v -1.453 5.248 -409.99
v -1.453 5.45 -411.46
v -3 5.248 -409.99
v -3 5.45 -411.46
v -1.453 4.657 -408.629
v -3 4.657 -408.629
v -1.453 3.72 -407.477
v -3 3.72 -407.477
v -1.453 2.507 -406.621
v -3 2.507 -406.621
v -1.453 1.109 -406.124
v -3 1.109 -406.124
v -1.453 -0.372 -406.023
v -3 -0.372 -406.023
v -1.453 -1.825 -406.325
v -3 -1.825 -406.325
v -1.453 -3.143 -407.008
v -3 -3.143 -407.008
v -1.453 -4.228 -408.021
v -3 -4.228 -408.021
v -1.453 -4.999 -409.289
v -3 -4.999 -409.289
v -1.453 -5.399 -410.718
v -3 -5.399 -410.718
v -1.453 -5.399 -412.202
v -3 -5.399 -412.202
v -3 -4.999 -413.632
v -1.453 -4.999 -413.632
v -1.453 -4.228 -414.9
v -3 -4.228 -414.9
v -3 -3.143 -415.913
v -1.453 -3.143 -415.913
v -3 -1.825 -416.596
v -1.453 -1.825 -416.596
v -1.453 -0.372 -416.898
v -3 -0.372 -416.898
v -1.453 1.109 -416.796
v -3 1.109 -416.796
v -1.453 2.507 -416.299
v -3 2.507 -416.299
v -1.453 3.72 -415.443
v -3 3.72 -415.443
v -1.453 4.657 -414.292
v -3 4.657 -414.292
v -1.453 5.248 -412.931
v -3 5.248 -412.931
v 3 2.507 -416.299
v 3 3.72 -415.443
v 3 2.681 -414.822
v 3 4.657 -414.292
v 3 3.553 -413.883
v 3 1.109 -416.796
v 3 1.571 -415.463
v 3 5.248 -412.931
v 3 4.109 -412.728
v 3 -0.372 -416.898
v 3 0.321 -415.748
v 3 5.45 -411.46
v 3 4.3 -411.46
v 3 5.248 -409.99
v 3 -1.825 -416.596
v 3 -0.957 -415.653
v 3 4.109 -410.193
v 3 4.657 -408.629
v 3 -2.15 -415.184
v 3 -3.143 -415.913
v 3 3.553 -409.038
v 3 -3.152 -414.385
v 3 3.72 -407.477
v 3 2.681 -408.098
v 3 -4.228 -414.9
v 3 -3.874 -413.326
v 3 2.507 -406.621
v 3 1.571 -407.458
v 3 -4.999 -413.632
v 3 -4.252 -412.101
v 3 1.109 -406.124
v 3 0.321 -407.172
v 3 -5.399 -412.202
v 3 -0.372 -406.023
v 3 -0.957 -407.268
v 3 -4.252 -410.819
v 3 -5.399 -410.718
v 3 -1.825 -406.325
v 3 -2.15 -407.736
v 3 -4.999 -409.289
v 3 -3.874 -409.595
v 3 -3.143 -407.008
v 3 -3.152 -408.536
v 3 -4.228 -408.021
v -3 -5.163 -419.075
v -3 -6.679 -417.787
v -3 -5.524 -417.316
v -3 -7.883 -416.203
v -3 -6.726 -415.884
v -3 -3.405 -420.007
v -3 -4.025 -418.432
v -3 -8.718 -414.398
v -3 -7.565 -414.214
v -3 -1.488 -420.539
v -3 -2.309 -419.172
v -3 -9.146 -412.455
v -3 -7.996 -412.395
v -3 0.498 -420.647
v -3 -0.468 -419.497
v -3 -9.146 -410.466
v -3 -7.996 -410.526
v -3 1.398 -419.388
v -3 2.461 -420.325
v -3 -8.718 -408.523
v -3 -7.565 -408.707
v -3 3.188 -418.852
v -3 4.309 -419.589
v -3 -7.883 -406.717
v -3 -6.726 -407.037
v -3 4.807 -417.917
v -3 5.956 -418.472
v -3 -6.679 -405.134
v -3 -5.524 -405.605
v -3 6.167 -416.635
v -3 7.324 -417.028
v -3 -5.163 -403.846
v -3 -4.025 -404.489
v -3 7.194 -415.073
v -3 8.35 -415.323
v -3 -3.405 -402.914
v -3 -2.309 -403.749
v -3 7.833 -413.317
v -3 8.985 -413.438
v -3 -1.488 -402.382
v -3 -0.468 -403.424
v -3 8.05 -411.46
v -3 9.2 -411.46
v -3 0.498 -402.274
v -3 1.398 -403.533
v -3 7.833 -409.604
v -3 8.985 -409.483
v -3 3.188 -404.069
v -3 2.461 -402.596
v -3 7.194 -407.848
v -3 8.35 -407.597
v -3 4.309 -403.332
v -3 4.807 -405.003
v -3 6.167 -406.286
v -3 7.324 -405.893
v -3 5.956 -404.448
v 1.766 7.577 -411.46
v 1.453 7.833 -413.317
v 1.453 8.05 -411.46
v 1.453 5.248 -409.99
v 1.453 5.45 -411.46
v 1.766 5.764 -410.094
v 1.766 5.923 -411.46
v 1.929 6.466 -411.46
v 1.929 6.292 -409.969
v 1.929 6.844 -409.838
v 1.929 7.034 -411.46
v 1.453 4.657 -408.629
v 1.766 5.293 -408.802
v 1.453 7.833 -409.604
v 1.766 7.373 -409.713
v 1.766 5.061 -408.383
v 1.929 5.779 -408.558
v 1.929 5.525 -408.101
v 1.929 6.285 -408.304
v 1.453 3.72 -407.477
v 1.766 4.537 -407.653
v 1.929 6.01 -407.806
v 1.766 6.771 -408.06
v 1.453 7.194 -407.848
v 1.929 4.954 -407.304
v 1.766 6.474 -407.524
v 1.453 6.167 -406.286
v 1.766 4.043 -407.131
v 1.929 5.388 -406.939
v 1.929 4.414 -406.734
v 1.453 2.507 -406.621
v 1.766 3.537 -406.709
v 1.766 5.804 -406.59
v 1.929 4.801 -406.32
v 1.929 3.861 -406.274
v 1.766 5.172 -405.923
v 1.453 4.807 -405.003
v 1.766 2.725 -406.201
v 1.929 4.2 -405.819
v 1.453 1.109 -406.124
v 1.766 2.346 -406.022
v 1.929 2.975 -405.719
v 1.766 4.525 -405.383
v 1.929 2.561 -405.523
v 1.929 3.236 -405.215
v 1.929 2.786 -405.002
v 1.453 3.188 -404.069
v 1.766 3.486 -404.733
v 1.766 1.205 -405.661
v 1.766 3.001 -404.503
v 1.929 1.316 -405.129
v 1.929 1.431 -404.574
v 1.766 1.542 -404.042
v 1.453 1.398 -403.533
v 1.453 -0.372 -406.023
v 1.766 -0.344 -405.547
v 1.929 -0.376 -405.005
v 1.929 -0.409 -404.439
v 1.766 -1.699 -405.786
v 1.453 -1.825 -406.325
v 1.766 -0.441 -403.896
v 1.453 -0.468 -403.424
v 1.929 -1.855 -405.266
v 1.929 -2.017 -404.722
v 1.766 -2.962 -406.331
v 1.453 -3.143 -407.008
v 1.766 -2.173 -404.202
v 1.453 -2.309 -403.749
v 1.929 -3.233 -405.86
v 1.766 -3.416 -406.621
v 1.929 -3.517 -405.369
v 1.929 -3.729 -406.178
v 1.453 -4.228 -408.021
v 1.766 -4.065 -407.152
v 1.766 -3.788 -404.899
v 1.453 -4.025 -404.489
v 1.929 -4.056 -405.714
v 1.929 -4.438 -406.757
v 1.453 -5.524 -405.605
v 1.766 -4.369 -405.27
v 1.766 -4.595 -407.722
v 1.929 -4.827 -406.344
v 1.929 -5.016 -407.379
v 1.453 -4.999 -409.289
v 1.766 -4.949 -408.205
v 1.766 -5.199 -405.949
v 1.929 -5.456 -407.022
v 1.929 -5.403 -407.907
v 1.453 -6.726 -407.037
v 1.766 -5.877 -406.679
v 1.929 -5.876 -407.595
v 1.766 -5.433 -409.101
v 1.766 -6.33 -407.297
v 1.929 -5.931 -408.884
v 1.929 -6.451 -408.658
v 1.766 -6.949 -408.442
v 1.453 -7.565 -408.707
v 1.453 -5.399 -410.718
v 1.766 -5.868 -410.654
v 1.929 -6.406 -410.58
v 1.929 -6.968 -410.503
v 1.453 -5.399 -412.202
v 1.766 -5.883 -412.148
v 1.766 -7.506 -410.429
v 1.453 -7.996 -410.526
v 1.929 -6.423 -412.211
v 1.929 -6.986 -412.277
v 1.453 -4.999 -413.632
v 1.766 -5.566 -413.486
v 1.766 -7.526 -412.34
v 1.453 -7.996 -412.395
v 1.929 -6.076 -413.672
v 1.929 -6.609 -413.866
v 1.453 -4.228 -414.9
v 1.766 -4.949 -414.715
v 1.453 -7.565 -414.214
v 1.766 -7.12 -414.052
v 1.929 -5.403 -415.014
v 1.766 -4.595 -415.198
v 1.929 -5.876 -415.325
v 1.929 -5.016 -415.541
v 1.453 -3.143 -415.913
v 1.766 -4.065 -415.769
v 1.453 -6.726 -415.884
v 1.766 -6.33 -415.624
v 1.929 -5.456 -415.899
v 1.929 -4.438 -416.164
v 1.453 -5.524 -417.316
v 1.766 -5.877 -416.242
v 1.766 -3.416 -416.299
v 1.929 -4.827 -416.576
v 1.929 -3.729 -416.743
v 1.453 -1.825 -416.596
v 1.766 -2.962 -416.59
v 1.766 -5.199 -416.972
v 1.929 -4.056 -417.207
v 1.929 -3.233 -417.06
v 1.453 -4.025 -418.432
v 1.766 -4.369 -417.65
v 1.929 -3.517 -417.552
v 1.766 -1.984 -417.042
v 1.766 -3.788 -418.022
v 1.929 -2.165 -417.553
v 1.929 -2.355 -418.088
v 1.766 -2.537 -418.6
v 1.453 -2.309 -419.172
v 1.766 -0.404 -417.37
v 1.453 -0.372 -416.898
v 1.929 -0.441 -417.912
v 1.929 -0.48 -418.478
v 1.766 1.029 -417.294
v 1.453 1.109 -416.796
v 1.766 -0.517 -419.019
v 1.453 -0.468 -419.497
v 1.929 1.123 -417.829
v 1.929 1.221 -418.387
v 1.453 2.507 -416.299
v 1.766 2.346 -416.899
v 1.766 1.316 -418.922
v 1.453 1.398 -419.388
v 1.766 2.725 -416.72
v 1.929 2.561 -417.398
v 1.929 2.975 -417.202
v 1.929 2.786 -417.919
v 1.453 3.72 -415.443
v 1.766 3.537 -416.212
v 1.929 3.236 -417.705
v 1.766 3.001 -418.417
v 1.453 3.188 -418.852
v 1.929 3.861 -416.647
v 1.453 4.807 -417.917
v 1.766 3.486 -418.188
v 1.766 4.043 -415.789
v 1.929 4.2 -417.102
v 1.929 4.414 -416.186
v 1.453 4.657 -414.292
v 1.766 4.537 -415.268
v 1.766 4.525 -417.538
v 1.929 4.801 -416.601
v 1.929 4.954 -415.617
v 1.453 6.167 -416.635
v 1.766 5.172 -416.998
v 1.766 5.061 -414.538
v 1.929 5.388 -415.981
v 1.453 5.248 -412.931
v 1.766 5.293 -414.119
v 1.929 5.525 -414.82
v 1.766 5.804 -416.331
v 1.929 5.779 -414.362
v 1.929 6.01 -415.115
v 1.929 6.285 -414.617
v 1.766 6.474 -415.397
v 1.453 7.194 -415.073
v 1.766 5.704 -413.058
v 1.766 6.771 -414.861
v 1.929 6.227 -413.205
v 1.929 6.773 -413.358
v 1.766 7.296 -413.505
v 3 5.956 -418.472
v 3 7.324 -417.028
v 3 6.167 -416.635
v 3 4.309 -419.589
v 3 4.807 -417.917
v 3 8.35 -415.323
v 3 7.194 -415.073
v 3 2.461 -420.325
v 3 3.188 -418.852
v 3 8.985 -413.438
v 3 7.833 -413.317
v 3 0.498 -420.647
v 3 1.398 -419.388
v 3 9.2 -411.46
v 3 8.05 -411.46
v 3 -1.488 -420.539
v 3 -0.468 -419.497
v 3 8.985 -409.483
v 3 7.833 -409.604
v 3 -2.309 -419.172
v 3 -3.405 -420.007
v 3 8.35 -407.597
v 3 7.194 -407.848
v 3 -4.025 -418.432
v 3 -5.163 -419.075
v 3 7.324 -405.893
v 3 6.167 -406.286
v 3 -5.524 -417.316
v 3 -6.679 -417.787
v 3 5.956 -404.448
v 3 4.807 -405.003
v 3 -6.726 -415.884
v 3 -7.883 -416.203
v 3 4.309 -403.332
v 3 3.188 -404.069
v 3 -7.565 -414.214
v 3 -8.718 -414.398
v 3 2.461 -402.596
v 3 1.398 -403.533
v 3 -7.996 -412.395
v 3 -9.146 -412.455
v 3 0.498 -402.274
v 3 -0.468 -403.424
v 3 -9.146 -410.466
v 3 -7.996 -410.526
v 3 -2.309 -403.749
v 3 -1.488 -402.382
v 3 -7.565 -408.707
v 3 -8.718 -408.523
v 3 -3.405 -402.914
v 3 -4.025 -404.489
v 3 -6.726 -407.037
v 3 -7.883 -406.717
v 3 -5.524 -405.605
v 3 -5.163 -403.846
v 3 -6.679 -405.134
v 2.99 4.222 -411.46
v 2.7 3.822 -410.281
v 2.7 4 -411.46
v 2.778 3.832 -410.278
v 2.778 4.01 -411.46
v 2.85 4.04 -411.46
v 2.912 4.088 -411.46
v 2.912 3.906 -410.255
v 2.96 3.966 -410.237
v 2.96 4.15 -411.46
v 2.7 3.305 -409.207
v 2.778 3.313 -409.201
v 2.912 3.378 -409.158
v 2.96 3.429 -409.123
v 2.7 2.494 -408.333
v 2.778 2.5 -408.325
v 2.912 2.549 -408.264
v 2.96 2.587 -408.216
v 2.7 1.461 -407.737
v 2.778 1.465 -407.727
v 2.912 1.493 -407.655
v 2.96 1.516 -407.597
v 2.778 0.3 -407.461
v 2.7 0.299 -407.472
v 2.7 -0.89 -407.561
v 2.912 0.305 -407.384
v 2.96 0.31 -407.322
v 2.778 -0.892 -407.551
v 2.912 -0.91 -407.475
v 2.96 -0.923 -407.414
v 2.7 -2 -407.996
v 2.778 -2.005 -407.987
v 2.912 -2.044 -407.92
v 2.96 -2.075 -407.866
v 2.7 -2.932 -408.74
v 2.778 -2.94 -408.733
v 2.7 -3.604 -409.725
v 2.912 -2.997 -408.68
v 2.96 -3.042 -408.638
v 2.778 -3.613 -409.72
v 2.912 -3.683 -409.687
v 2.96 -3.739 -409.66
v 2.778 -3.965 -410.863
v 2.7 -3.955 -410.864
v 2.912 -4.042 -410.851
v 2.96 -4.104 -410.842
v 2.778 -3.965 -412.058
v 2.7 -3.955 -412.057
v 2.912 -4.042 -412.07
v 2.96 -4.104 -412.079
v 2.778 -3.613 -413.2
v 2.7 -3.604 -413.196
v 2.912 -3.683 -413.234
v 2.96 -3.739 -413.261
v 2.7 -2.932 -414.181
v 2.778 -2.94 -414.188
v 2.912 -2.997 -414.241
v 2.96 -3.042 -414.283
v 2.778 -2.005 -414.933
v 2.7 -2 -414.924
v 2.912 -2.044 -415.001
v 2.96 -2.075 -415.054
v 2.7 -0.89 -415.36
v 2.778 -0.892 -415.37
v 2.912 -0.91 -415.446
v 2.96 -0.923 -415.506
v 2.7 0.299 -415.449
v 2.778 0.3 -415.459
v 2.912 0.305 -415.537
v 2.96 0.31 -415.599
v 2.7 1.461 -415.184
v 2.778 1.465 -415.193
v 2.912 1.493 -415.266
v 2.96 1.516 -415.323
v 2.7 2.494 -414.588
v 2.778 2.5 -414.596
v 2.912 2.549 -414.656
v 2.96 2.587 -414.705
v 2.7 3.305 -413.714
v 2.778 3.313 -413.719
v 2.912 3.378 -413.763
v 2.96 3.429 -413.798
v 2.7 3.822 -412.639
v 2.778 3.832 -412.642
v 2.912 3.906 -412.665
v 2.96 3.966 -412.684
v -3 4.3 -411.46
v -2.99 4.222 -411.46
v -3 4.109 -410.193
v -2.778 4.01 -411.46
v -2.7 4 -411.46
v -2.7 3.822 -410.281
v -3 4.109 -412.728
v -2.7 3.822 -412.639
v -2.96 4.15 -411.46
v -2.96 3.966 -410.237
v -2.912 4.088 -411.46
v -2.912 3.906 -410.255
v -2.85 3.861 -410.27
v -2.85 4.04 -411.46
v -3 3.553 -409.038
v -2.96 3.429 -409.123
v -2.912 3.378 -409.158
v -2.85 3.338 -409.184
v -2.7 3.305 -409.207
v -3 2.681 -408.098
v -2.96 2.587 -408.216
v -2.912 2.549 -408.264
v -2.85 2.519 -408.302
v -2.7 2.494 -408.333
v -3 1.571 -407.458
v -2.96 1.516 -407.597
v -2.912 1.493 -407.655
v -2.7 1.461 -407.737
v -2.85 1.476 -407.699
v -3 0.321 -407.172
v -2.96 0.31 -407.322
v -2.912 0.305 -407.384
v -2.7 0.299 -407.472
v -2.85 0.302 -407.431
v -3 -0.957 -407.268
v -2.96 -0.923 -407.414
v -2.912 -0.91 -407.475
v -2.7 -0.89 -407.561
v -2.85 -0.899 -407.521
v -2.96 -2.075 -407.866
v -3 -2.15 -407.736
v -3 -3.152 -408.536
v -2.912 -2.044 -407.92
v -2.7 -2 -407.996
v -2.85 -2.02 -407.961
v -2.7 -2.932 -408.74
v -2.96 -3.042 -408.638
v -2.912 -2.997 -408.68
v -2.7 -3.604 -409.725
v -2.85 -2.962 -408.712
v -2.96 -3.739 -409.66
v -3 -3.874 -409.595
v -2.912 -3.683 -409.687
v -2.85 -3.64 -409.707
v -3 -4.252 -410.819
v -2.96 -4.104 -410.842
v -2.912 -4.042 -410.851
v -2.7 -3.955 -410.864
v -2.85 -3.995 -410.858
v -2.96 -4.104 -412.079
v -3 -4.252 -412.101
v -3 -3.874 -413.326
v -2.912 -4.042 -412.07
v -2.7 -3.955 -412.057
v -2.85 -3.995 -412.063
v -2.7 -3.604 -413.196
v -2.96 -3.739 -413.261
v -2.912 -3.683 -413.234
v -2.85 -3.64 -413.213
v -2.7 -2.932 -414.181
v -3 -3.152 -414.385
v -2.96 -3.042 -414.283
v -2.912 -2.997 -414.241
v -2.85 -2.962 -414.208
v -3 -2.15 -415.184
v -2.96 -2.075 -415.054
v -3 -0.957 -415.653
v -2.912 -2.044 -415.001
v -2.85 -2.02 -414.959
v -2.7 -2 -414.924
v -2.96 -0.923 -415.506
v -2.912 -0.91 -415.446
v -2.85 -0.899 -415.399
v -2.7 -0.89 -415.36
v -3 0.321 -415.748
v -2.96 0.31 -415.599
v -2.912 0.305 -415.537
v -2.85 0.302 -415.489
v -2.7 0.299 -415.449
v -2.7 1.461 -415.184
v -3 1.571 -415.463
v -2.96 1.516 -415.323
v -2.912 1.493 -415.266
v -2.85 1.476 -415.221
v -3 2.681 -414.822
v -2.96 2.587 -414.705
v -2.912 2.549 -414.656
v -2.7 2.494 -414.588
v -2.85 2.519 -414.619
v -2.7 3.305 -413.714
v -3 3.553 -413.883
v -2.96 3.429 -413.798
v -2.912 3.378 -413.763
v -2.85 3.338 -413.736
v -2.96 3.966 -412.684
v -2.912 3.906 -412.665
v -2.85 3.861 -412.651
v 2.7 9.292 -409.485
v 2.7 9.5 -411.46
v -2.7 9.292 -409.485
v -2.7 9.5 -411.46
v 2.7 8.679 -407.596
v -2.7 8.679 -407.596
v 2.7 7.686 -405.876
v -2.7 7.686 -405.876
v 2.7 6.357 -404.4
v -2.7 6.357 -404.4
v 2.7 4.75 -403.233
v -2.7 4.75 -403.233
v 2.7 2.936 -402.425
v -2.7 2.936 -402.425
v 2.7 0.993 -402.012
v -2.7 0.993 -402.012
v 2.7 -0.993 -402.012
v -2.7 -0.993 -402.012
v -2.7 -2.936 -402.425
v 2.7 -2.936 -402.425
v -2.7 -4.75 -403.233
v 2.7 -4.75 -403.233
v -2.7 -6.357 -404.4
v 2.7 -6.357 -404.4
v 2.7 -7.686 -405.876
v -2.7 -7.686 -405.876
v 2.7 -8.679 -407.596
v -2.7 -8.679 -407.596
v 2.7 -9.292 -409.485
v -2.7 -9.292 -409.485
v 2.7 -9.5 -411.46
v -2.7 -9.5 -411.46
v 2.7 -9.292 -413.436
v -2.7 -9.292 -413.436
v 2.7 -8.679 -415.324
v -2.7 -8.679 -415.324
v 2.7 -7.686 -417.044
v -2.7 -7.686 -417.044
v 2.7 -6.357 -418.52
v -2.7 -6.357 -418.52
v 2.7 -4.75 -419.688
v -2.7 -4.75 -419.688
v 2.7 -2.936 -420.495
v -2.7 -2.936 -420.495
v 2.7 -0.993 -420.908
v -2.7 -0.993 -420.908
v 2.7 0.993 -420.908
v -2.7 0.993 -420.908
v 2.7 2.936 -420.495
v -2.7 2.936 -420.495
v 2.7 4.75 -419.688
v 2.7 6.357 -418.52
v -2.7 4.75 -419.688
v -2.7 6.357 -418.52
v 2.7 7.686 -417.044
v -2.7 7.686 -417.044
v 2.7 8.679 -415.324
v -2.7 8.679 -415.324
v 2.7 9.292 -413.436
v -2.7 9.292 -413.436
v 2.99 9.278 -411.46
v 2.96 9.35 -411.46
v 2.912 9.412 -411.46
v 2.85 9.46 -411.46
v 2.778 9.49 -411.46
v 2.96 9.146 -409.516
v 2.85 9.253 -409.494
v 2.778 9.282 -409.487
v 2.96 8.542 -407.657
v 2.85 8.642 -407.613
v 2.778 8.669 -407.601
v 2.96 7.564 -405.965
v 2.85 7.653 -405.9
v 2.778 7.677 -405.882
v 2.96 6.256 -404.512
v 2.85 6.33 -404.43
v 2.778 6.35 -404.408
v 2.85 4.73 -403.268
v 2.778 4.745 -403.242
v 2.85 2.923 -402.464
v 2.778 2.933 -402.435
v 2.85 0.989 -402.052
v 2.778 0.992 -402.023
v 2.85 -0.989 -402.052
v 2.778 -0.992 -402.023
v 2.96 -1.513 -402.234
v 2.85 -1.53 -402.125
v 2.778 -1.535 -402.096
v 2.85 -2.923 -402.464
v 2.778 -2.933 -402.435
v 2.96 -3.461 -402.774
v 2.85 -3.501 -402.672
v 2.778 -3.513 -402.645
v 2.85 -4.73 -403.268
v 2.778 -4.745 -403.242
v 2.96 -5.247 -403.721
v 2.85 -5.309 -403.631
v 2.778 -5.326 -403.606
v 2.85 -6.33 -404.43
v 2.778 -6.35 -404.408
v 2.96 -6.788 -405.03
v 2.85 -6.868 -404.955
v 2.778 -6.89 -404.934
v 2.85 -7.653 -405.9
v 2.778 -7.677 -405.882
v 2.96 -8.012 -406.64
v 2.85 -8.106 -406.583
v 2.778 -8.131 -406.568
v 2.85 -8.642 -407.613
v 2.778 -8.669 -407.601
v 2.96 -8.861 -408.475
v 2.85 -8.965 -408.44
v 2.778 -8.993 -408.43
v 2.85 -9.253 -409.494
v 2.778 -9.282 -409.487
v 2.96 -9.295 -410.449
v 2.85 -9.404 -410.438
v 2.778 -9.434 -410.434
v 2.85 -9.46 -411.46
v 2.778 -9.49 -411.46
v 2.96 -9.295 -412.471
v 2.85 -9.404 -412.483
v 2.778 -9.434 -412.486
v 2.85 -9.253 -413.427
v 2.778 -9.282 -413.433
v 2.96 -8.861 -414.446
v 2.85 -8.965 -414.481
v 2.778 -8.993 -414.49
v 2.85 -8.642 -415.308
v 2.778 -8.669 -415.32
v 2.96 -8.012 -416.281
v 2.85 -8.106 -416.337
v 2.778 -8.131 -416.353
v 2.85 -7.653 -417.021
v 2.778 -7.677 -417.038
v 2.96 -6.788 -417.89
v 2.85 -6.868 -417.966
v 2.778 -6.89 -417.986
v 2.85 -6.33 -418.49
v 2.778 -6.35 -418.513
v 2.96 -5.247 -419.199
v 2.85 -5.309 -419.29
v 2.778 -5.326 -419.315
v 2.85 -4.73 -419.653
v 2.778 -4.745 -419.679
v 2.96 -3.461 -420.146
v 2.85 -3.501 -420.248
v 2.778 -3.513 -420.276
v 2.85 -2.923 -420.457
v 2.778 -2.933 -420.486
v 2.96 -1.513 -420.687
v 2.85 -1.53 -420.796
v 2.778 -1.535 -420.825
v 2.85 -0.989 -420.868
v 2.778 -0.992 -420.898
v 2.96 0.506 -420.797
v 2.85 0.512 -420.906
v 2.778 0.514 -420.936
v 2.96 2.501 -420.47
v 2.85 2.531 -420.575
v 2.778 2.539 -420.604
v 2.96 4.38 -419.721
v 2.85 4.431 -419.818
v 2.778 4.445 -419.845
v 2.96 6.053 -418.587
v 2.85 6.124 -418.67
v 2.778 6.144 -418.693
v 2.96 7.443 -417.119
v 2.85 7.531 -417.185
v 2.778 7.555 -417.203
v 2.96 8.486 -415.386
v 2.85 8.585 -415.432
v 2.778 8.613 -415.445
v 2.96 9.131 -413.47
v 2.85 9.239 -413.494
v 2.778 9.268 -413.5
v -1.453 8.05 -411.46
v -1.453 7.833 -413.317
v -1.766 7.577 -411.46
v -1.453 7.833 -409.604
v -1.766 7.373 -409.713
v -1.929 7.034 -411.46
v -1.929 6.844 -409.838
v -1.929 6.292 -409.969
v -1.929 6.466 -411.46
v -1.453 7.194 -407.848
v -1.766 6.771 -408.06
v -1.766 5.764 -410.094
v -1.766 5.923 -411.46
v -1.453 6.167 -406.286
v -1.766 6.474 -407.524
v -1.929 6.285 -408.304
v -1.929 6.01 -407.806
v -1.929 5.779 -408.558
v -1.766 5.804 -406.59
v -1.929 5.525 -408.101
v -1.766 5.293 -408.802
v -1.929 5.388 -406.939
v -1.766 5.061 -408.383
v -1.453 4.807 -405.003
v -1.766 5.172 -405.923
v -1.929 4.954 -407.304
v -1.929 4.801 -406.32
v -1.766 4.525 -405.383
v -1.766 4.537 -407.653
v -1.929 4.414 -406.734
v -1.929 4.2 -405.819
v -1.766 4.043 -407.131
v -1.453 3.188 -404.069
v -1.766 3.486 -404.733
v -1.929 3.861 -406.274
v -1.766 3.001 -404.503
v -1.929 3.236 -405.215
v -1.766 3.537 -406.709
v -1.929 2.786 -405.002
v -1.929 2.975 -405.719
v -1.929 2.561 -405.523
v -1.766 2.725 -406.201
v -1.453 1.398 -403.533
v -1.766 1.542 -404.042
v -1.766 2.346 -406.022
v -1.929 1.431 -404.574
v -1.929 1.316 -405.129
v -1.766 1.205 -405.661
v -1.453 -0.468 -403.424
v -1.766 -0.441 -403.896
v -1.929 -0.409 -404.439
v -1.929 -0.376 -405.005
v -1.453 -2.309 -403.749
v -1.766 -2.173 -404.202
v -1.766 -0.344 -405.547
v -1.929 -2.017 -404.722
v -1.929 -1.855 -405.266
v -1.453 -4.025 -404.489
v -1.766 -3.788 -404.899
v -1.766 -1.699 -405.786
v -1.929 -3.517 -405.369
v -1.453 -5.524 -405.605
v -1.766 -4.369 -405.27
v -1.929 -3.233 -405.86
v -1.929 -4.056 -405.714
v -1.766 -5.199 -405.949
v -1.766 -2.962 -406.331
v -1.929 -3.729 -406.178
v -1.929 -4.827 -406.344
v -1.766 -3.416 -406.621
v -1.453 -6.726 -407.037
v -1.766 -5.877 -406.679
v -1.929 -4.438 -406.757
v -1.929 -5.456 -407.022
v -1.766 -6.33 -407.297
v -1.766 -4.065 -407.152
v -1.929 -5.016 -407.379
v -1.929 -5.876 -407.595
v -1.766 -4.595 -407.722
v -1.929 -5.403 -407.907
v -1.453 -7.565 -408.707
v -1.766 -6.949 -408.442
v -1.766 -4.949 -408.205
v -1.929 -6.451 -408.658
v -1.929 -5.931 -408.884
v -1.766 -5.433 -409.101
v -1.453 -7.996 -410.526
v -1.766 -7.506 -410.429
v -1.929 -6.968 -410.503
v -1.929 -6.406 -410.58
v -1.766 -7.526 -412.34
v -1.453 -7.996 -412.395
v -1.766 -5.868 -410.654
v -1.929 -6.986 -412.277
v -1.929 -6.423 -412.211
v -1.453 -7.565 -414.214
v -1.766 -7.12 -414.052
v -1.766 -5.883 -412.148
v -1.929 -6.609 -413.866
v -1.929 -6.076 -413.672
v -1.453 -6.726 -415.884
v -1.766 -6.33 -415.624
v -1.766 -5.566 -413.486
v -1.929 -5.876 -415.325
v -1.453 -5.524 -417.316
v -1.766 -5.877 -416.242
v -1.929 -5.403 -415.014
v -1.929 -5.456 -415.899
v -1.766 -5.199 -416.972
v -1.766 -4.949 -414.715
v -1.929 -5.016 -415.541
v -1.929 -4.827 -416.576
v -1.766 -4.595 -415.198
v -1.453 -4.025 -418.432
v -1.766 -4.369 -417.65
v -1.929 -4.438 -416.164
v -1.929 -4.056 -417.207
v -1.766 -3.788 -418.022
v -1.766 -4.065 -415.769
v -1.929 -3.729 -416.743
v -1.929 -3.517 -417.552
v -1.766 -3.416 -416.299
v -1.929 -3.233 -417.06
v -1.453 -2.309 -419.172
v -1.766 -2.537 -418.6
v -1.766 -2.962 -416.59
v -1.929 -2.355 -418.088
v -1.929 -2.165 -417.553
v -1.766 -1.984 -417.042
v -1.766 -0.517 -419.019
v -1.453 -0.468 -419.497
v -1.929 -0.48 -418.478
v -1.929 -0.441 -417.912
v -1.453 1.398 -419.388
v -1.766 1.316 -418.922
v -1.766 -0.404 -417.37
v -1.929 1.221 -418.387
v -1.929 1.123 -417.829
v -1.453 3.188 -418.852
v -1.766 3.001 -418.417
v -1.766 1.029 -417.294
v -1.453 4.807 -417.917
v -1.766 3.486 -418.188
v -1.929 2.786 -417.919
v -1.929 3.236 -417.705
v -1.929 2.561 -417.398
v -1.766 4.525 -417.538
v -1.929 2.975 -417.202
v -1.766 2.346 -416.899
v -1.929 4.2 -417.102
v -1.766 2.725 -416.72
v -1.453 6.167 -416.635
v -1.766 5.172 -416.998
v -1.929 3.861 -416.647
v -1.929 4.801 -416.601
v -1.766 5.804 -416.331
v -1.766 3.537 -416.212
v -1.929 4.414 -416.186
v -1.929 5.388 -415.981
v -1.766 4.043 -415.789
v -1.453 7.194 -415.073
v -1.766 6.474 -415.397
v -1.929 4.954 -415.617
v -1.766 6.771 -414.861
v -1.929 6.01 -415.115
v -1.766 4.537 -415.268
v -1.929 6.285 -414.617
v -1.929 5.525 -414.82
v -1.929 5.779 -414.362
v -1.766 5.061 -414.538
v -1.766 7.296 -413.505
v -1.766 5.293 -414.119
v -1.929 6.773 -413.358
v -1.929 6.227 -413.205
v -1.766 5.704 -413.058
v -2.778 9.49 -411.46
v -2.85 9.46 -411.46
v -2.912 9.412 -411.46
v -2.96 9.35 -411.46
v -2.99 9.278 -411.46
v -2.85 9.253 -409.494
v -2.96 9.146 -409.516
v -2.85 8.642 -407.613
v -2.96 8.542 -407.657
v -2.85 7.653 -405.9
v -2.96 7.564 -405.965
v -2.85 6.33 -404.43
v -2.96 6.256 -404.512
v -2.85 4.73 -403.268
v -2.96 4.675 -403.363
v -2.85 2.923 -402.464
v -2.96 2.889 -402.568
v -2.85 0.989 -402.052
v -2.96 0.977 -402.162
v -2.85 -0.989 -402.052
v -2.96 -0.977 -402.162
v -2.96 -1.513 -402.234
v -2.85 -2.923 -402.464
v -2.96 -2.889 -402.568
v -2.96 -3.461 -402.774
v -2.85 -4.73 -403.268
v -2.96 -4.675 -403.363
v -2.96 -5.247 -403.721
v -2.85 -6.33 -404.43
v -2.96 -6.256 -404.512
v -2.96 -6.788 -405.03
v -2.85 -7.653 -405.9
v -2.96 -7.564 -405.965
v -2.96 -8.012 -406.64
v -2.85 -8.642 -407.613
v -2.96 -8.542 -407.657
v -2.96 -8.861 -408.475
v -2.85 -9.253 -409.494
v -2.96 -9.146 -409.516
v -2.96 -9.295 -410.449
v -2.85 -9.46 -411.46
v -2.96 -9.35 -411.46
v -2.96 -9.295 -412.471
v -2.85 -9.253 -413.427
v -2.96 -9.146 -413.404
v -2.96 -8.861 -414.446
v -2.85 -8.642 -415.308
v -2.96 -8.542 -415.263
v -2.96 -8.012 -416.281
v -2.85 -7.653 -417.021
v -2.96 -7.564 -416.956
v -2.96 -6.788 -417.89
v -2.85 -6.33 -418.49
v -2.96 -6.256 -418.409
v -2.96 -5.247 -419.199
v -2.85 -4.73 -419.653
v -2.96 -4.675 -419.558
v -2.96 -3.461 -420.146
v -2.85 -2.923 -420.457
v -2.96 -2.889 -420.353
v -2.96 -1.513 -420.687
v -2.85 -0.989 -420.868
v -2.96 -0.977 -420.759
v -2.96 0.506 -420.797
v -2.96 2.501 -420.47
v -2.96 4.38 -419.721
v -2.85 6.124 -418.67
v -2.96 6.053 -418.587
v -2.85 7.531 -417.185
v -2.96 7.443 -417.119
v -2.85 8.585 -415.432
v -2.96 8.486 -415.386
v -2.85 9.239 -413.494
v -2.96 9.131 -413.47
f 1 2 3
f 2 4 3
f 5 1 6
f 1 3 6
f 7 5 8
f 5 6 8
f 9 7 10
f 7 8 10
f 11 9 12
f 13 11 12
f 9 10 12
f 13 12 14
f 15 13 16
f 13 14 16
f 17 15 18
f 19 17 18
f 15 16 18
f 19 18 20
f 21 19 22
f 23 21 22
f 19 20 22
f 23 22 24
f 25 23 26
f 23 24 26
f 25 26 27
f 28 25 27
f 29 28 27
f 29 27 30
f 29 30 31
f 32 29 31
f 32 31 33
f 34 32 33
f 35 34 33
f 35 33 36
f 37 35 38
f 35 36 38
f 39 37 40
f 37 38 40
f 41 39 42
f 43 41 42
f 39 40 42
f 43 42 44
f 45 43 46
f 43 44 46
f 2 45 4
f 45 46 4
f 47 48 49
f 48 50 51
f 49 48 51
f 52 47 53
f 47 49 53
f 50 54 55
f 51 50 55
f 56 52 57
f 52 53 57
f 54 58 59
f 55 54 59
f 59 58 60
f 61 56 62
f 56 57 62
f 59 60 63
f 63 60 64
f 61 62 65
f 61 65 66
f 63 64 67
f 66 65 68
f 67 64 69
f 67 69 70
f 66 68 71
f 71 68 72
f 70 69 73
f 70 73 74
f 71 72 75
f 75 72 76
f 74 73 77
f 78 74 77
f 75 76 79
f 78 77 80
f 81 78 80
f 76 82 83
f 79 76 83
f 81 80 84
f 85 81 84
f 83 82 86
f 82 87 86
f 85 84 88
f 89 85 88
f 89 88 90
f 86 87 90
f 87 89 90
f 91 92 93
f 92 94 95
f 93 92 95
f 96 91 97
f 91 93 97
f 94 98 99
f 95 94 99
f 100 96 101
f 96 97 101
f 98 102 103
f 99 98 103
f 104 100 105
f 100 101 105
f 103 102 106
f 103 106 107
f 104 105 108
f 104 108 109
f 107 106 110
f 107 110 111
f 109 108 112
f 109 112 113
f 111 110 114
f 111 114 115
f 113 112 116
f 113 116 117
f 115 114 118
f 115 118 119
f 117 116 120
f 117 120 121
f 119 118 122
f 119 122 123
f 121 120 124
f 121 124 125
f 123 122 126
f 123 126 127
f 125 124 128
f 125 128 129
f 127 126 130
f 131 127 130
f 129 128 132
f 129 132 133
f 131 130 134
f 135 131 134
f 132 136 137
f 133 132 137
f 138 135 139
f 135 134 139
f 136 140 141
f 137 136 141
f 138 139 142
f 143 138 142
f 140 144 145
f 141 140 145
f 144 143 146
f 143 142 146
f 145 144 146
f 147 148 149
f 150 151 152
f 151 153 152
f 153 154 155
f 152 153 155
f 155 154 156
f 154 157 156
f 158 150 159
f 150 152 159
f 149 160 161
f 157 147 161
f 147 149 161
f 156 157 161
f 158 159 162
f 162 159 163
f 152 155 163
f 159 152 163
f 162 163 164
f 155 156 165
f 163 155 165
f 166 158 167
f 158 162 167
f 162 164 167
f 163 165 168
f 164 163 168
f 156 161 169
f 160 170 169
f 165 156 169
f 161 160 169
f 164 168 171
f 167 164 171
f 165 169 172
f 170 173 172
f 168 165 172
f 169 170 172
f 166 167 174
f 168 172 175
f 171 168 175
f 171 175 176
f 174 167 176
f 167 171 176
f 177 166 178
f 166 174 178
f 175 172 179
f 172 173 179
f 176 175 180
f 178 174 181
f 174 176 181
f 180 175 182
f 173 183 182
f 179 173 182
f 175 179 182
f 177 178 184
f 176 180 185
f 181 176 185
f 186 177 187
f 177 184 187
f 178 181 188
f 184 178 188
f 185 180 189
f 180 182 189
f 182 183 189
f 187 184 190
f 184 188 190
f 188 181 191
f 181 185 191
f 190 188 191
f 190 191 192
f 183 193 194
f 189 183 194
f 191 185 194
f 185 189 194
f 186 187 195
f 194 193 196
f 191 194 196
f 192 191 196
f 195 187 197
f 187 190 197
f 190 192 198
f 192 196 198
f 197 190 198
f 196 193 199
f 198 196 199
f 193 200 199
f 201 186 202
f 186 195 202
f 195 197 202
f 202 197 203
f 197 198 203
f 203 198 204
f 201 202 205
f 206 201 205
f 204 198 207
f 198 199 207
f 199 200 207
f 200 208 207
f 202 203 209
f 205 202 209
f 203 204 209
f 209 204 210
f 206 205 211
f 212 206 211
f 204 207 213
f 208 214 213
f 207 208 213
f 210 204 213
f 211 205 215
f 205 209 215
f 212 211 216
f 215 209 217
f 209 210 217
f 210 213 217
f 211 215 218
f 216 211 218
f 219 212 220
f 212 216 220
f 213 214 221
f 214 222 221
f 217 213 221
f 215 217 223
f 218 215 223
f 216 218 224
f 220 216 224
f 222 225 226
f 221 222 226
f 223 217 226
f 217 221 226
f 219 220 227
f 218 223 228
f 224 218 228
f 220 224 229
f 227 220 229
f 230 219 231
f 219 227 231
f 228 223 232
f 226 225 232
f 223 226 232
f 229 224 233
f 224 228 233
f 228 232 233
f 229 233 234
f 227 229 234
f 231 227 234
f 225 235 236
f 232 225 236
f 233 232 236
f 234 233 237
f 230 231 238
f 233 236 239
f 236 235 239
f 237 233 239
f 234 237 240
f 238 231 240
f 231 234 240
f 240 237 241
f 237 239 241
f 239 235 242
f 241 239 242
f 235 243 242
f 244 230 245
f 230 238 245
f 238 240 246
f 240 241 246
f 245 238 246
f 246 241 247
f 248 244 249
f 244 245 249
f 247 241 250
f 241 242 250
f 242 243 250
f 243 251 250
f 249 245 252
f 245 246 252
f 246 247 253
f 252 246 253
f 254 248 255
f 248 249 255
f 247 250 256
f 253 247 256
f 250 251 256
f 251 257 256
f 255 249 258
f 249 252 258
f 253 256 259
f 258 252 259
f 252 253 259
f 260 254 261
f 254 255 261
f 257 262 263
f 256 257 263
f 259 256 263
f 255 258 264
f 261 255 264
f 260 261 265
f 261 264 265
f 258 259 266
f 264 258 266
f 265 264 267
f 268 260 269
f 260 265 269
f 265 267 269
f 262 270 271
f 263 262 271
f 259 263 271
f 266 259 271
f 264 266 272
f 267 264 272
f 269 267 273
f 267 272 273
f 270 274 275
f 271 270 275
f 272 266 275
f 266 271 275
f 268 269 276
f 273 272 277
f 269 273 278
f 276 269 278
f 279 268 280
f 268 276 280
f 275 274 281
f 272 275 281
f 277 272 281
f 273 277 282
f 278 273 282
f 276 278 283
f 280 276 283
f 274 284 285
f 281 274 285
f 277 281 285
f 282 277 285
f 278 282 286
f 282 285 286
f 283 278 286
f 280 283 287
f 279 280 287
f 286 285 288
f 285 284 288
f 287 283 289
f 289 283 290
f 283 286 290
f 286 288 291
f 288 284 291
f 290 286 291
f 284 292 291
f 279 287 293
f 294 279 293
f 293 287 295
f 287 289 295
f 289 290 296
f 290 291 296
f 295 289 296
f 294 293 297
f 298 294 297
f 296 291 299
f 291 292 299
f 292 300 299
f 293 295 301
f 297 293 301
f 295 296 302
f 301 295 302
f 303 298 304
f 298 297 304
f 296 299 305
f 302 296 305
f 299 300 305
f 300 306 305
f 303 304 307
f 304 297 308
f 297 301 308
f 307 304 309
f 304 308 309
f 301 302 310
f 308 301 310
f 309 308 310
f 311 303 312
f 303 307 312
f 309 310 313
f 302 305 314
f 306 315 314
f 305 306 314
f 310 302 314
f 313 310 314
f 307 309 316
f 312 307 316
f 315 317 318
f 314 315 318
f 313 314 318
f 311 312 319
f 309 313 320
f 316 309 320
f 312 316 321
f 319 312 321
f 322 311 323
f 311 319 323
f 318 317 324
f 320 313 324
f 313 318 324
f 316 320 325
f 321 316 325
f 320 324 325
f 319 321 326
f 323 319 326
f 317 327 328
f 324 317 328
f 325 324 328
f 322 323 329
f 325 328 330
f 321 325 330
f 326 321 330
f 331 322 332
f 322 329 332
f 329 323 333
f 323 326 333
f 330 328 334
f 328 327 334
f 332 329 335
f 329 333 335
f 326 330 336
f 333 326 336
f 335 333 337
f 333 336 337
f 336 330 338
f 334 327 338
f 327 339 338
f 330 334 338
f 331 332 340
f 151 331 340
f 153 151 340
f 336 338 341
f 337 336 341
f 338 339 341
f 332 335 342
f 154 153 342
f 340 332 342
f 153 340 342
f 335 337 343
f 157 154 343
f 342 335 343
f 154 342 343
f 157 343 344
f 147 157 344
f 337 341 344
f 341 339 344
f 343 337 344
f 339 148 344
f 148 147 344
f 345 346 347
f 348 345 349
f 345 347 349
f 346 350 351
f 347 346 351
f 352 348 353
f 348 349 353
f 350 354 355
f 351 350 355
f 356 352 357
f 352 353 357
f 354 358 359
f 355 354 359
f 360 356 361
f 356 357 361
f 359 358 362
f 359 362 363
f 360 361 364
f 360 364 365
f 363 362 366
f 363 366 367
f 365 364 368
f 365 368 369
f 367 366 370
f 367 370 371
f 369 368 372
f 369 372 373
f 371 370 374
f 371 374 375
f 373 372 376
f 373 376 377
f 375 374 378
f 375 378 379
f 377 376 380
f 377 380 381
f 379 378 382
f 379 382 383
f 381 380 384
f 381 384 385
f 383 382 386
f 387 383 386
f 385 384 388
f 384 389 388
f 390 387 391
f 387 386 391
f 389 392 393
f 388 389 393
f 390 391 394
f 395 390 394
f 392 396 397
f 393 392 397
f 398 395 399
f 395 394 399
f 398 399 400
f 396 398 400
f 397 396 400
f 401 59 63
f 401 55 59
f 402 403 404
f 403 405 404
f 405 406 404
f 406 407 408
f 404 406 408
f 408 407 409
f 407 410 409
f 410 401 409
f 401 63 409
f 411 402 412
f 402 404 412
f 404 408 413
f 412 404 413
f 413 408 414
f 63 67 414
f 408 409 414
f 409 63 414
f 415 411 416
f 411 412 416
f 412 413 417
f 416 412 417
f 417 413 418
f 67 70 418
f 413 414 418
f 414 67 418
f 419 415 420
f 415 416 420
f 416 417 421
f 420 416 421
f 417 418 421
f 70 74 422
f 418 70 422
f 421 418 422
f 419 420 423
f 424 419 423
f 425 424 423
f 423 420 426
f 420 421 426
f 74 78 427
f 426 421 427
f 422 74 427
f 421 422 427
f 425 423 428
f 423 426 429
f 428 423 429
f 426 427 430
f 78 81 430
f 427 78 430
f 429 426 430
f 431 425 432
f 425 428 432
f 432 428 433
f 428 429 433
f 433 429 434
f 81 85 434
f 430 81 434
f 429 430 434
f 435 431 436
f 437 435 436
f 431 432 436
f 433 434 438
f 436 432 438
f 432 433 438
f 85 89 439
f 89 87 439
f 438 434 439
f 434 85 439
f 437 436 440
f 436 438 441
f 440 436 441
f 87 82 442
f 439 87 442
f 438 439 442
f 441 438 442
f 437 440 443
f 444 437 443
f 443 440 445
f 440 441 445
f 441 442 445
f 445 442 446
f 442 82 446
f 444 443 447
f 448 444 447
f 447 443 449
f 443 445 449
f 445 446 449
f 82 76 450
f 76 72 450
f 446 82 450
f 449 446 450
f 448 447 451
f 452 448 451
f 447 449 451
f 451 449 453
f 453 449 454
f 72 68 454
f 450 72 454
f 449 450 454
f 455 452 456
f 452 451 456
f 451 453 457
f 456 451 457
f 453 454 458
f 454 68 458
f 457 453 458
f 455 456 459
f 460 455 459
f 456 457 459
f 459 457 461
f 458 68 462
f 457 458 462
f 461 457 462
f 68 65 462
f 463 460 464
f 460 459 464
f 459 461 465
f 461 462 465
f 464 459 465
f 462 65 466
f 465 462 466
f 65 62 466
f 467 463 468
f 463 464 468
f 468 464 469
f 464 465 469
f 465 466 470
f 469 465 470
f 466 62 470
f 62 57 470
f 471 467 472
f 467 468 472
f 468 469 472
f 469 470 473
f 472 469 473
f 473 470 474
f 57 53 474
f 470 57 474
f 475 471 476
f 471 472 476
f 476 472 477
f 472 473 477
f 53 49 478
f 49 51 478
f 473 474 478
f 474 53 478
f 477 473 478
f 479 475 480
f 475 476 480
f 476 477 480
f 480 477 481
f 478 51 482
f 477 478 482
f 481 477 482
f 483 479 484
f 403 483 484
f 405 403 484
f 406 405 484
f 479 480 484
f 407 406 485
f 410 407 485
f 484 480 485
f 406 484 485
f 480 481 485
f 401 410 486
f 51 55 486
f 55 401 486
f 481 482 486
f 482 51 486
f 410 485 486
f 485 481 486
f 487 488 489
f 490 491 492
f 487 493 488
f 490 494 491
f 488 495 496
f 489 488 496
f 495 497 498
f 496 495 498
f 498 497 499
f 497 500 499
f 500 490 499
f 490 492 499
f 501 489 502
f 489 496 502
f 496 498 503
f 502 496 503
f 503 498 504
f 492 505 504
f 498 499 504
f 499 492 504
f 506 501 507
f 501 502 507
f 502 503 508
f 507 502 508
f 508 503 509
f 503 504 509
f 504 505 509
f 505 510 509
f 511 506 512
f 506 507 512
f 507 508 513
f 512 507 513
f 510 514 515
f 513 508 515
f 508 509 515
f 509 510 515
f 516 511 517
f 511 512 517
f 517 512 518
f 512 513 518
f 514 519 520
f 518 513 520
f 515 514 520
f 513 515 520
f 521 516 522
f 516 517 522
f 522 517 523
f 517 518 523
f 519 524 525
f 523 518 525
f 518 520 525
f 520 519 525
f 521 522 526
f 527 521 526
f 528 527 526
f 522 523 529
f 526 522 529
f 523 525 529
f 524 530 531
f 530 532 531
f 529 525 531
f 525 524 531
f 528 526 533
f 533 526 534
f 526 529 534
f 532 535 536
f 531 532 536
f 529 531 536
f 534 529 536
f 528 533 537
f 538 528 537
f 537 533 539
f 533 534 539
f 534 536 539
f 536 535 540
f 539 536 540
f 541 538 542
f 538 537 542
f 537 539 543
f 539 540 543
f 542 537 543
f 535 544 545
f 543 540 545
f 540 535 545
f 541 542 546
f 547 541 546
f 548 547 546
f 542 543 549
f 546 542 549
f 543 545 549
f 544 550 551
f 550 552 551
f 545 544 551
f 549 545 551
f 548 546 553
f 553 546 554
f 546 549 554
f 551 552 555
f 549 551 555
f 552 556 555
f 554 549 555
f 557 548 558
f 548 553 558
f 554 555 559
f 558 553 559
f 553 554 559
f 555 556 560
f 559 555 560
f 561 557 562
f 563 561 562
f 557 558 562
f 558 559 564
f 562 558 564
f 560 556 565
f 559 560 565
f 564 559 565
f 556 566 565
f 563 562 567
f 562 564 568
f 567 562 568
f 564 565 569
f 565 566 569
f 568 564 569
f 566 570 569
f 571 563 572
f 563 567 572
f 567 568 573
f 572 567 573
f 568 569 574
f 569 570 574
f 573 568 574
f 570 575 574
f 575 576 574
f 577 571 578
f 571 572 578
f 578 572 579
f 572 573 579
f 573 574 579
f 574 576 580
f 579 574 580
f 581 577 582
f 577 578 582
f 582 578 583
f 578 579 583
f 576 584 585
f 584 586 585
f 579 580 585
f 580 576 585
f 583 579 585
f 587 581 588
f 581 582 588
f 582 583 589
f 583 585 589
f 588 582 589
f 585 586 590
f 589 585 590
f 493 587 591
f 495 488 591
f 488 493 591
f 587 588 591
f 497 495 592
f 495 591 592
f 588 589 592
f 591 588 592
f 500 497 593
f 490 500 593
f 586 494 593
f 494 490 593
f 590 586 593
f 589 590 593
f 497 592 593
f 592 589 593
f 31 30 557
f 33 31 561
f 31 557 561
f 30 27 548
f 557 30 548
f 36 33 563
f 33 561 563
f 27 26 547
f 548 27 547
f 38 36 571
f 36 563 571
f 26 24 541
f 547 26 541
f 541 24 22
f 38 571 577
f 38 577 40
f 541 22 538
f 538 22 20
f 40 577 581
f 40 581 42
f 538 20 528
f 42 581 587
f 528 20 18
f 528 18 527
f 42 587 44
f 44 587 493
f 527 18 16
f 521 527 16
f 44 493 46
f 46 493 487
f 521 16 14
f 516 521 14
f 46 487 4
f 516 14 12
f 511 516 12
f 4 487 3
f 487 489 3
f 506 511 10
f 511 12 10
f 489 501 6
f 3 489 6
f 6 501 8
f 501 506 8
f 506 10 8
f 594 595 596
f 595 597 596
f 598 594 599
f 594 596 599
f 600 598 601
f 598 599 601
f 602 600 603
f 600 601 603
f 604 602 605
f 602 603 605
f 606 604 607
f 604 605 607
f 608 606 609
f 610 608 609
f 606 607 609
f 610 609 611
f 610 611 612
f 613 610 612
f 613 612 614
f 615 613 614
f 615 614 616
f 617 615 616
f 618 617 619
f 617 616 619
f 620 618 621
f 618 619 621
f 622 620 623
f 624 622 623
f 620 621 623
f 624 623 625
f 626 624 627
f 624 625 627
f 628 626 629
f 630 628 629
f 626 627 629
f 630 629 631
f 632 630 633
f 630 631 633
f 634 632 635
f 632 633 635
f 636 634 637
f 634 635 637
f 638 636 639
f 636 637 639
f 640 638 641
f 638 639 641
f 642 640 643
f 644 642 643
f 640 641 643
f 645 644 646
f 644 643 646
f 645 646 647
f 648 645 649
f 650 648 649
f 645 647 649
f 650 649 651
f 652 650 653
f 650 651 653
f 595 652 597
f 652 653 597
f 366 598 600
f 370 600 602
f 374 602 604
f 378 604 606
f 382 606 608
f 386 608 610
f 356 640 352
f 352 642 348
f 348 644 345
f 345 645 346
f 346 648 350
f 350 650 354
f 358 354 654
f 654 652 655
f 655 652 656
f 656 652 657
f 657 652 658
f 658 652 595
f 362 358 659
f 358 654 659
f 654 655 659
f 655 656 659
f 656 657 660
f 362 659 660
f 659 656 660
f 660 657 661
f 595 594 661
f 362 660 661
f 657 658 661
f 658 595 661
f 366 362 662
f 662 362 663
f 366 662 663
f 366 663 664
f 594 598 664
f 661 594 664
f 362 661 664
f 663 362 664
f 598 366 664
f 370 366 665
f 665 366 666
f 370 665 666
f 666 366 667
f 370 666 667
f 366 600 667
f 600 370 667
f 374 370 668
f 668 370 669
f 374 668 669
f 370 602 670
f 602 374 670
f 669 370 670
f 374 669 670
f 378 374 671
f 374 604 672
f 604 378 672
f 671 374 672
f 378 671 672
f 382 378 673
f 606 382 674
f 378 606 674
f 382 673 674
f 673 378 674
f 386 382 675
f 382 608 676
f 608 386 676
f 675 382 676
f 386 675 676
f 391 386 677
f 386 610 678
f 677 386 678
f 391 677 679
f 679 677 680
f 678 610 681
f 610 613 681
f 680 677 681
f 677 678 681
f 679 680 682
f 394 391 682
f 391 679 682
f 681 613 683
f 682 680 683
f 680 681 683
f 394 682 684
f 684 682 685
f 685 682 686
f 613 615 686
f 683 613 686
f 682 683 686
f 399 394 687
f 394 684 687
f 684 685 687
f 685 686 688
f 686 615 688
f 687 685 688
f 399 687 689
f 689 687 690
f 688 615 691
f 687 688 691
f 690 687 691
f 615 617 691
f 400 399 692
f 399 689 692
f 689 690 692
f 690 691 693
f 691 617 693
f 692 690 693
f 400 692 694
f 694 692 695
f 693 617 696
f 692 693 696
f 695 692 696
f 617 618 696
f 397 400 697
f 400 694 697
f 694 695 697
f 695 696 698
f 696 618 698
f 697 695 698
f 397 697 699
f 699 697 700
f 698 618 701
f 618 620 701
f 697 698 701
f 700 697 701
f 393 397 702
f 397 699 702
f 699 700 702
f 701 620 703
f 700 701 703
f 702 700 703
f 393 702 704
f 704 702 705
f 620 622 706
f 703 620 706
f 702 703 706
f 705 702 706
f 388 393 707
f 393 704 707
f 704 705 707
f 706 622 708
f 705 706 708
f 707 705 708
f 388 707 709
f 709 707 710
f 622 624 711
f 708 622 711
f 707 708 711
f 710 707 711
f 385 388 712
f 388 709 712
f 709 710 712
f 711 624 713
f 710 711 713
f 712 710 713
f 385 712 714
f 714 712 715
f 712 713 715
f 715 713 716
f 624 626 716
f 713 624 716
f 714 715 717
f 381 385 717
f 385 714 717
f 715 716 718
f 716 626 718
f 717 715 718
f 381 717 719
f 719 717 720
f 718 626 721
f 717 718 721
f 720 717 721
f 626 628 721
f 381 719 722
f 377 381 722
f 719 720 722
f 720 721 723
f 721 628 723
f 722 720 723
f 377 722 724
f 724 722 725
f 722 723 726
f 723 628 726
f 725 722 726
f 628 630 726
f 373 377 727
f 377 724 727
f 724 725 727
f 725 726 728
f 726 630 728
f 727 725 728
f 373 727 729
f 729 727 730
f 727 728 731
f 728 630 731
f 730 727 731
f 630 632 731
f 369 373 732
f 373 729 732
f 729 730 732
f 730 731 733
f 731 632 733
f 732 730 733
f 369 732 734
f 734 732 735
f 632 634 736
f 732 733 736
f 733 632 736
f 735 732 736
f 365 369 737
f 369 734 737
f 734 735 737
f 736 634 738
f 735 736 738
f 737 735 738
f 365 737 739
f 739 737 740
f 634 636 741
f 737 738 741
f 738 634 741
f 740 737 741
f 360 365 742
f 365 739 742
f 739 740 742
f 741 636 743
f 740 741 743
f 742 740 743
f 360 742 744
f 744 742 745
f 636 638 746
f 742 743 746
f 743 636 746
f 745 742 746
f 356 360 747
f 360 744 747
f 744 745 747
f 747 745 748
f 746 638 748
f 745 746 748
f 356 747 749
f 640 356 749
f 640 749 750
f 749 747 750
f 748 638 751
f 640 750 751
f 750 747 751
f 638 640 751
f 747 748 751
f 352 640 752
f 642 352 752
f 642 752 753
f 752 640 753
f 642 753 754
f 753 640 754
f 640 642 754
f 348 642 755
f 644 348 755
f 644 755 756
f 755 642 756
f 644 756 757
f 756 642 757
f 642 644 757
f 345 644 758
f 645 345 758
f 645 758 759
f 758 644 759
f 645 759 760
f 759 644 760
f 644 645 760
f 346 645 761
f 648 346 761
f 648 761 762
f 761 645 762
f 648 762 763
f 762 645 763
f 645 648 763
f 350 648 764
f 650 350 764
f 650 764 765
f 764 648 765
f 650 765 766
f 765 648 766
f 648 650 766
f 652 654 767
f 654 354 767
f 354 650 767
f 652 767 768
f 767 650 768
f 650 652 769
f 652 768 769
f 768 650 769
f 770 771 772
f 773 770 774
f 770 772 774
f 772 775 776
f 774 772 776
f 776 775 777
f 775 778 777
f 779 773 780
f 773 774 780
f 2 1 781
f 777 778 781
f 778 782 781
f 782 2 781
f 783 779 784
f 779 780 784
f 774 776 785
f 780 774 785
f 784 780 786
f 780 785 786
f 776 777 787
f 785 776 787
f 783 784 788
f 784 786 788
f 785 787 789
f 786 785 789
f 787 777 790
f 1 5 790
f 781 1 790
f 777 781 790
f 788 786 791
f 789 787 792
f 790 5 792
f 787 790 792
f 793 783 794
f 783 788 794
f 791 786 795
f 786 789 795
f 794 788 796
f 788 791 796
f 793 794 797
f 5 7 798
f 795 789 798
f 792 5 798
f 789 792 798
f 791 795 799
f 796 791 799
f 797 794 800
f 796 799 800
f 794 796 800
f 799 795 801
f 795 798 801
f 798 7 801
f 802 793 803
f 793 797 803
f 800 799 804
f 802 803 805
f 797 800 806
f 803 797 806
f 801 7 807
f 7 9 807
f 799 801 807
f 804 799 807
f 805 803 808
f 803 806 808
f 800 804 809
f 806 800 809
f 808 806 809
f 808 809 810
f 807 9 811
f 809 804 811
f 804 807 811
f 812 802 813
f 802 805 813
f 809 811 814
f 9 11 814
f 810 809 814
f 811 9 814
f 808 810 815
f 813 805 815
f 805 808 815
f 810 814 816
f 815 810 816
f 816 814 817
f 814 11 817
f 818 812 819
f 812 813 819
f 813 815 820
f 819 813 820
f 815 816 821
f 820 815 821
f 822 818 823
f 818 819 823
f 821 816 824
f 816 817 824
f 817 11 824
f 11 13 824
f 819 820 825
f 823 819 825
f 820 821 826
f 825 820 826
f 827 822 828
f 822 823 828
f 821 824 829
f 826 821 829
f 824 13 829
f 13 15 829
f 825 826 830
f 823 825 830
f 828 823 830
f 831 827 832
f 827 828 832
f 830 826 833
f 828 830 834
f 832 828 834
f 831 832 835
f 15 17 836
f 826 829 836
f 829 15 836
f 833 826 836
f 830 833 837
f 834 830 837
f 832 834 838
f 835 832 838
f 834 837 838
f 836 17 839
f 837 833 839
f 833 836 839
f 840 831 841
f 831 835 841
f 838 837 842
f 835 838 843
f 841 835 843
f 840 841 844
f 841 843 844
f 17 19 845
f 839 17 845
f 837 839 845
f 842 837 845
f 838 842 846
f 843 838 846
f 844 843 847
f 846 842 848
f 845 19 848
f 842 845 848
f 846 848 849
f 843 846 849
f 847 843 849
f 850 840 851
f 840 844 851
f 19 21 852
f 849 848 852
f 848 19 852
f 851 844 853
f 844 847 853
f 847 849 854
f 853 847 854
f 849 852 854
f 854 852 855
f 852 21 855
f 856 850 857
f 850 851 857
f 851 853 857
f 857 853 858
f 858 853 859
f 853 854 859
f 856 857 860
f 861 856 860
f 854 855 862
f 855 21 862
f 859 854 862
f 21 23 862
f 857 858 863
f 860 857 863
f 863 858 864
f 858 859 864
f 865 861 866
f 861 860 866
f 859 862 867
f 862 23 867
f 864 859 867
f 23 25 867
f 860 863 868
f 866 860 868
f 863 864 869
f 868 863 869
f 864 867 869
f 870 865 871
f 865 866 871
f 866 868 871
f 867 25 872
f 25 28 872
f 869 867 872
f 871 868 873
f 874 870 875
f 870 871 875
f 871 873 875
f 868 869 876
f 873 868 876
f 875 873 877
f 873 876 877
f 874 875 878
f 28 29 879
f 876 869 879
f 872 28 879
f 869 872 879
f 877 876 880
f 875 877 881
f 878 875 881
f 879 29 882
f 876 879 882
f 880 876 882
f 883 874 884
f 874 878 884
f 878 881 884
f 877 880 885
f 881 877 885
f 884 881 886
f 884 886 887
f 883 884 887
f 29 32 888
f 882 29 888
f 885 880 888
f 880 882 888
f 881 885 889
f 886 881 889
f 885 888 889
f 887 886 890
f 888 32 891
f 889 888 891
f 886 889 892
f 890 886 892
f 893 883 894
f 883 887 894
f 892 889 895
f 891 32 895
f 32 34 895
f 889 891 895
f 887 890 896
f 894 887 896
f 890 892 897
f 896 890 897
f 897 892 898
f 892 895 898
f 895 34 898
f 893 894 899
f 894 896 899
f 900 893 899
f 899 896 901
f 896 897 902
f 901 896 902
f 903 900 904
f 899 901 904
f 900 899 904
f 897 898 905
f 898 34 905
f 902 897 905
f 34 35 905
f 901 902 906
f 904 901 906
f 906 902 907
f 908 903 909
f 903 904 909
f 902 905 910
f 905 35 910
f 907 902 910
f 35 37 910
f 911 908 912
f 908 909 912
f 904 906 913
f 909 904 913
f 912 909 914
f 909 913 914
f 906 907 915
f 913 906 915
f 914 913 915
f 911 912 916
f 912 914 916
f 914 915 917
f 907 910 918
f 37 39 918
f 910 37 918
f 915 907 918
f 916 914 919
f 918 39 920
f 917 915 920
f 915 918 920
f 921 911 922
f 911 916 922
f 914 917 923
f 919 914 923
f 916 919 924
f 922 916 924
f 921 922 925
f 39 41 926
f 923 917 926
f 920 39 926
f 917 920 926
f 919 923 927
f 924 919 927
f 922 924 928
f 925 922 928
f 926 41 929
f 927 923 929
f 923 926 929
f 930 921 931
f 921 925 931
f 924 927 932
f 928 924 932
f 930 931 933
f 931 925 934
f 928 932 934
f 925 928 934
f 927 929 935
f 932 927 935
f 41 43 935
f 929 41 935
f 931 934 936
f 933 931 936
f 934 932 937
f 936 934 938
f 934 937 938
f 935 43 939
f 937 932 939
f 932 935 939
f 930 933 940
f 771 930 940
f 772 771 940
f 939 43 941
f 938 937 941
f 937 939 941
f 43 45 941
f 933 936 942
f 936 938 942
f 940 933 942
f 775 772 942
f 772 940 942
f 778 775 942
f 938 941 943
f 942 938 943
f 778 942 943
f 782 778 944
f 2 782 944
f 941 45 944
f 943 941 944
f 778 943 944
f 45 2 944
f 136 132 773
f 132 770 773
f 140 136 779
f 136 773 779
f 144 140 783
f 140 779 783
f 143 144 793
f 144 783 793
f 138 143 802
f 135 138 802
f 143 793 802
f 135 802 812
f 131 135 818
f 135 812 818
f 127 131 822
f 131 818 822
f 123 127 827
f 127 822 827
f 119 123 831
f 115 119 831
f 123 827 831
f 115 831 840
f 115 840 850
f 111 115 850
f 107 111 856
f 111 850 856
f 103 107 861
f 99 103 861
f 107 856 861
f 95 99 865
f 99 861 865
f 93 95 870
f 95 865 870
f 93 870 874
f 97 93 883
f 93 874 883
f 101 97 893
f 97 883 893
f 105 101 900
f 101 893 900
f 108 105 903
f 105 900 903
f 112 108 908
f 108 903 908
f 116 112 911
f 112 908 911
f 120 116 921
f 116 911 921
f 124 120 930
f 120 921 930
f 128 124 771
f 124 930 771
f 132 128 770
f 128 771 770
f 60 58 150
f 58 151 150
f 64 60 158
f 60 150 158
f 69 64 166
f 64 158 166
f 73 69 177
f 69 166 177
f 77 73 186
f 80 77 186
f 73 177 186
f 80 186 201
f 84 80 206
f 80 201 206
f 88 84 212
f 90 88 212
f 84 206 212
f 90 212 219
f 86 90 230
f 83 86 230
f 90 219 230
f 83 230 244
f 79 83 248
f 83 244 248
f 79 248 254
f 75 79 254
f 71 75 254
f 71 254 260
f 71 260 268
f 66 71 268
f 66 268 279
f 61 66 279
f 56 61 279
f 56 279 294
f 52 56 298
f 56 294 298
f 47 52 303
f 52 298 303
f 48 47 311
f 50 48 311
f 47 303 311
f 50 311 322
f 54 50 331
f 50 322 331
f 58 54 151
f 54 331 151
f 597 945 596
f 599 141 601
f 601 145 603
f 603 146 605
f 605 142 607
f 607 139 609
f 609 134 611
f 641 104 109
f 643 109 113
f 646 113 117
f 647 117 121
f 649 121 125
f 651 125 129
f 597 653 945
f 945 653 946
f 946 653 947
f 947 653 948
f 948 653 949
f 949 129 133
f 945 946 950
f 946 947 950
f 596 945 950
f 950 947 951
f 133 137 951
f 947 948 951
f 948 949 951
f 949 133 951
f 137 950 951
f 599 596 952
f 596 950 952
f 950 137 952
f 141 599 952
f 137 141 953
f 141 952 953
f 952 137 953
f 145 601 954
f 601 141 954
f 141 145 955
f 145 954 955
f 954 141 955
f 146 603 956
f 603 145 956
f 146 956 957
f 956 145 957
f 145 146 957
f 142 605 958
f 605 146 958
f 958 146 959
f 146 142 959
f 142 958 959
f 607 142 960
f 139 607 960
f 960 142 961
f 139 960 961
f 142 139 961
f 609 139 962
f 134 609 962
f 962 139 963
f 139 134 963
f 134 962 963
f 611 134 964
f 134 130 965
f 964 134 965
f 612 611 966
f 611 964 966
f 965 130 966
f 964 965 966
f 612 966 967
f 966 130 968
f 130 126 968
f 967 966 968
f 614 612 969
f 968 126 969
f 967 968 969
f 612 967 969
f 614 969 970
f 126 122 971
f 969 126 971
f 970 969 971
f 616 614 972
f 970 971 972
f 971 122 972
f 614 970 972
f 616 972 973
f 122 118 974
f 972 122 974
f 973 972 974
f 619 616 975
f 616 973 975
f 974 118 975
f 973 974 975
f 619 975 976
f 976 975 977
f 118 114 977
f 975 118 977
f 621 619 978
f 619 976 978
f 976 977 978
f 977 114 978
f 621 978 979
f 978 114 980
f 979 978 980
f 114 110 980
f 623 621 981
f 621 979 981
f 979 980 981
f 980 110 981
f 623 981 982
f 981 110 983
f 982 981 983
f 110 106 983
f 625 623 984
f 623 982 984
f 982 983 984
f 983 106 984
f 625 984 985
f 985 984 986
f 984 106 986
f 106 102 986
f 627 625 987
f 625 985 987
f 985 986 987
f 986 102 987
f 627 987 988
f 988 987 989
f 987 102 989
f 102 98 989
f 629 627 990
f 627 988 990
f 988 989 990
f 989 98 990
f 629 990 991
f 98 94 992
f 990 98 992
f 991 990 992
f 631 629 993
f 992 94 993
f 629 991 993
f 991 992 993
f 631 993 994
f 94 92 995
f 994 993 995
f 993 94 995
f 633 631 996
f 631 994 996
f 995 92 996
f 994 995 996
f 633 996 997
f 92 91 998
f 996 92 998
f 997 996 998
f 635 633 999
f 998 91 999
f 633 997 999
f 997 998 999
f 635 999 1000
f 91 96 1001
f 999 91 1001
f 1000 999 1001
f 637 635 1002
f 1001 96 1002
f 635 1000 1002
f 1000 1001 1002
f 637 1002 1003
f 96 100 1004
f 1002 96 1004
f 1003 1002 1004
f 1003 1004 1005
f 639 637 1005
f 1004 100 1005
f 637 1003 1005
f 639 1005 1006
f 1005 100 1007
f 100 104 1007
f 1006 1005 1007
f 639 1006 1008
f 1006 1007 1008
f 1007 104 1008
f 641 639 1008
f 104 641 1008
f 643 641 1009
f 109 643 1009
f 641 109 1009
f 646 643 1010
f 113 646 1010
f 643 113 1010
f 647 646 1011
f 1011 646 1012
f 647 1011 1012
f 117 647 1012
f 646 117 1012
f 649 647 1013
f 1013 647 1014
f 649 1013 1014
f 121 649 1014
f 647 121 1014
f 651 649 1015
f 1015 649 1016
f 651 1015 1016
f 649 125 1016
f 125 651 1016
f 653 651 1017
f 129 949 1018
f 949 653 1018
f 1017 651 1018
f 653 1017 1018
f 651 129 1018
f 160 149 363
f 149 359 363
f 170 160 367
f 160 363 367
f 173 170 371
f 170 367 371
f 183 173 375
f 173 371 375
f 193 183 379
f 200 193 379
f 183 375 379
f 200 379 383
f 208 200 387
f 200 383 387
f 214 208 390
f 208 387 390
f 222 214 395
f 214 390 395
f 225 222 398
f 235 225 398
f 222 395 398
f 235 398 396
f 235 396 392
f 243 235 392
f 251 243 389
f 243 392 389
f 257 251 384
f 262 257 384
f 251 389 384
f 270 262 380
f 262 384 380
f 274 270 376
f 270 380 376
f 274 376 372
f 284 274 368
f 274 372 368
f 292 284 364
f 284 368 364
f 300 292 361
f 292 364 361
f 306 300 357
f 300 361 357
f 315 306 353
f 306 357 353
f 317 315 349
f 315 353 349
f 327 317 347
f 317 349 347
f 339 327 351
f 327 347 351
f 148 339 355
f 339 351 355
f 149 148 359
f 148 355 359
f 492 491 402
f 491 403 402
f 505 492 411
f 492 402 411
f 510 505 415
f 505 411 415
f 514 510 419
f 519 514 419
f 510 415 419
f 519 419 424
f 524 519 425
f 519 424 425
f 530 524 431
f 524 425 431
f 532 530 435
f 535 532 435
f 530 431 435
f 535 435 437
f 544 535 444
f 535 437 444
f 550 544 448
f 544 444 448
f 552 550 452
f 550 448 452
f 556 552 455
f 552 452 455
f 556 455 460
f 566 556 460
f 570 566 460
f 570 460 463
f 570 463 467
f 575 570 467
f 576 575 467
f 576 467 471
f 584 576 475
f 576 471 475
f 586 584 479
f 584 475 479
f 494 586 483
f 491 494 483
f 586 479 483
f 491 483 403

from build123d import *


with BuildPart() as part:
    # Esquisse1 → Révolution1 (revolve)
    with BuildSketch(Plane.XY.offset(-411.460370859)):
        with BuildLine():
            Line((-2.7, 4), (2.7, 4))
            ThreePointArc((2.7, 4), (2.912132034, 4.087867966), (3, 4.3))
            Line((3, 4.3), (3, 5.45))
            Line((3, 5.45), (1.453444185, 5.45))
            ThreePointArc((1.453444185, 5.45), (1.95, 6.75), (1.453444185, 8.05))
            Line((1.453444185, 8.05), (3, 8.05))
            Line((3, 8.05), (3, 9.2))
            ThreePointArc((3, 9.2), (2.912132034, 9.412132034), (2.7, 9.5))
            Line((2.7, 9.5), (-2.7, 9.5))
            ThreePointArc((-2.7, 9.5), (-2.912132034, 9.412132034), (-3, 9.2))
            Line((-3, 9.2), (-3, 8.05))
            Line((-3, 8.05), (-1.453444185, 8.05))
            ThreePointArc((-1.453444185, 8.05), (-1.95, 6.75), (-1.453444185, 5.45))
            Line((-1.453444185, 5.45), (-3, 5.45))
            Line((-3, 5.45), (-3, 4.3))
            ThreePointArc((-3, 4.3), (-2.912132034, 4.087867966), (-2.7, 4))
        make_face()
    revolve(axis=Axis((-3, 0, -411.460370859), (1, 0, 0)))


solid = part.part
